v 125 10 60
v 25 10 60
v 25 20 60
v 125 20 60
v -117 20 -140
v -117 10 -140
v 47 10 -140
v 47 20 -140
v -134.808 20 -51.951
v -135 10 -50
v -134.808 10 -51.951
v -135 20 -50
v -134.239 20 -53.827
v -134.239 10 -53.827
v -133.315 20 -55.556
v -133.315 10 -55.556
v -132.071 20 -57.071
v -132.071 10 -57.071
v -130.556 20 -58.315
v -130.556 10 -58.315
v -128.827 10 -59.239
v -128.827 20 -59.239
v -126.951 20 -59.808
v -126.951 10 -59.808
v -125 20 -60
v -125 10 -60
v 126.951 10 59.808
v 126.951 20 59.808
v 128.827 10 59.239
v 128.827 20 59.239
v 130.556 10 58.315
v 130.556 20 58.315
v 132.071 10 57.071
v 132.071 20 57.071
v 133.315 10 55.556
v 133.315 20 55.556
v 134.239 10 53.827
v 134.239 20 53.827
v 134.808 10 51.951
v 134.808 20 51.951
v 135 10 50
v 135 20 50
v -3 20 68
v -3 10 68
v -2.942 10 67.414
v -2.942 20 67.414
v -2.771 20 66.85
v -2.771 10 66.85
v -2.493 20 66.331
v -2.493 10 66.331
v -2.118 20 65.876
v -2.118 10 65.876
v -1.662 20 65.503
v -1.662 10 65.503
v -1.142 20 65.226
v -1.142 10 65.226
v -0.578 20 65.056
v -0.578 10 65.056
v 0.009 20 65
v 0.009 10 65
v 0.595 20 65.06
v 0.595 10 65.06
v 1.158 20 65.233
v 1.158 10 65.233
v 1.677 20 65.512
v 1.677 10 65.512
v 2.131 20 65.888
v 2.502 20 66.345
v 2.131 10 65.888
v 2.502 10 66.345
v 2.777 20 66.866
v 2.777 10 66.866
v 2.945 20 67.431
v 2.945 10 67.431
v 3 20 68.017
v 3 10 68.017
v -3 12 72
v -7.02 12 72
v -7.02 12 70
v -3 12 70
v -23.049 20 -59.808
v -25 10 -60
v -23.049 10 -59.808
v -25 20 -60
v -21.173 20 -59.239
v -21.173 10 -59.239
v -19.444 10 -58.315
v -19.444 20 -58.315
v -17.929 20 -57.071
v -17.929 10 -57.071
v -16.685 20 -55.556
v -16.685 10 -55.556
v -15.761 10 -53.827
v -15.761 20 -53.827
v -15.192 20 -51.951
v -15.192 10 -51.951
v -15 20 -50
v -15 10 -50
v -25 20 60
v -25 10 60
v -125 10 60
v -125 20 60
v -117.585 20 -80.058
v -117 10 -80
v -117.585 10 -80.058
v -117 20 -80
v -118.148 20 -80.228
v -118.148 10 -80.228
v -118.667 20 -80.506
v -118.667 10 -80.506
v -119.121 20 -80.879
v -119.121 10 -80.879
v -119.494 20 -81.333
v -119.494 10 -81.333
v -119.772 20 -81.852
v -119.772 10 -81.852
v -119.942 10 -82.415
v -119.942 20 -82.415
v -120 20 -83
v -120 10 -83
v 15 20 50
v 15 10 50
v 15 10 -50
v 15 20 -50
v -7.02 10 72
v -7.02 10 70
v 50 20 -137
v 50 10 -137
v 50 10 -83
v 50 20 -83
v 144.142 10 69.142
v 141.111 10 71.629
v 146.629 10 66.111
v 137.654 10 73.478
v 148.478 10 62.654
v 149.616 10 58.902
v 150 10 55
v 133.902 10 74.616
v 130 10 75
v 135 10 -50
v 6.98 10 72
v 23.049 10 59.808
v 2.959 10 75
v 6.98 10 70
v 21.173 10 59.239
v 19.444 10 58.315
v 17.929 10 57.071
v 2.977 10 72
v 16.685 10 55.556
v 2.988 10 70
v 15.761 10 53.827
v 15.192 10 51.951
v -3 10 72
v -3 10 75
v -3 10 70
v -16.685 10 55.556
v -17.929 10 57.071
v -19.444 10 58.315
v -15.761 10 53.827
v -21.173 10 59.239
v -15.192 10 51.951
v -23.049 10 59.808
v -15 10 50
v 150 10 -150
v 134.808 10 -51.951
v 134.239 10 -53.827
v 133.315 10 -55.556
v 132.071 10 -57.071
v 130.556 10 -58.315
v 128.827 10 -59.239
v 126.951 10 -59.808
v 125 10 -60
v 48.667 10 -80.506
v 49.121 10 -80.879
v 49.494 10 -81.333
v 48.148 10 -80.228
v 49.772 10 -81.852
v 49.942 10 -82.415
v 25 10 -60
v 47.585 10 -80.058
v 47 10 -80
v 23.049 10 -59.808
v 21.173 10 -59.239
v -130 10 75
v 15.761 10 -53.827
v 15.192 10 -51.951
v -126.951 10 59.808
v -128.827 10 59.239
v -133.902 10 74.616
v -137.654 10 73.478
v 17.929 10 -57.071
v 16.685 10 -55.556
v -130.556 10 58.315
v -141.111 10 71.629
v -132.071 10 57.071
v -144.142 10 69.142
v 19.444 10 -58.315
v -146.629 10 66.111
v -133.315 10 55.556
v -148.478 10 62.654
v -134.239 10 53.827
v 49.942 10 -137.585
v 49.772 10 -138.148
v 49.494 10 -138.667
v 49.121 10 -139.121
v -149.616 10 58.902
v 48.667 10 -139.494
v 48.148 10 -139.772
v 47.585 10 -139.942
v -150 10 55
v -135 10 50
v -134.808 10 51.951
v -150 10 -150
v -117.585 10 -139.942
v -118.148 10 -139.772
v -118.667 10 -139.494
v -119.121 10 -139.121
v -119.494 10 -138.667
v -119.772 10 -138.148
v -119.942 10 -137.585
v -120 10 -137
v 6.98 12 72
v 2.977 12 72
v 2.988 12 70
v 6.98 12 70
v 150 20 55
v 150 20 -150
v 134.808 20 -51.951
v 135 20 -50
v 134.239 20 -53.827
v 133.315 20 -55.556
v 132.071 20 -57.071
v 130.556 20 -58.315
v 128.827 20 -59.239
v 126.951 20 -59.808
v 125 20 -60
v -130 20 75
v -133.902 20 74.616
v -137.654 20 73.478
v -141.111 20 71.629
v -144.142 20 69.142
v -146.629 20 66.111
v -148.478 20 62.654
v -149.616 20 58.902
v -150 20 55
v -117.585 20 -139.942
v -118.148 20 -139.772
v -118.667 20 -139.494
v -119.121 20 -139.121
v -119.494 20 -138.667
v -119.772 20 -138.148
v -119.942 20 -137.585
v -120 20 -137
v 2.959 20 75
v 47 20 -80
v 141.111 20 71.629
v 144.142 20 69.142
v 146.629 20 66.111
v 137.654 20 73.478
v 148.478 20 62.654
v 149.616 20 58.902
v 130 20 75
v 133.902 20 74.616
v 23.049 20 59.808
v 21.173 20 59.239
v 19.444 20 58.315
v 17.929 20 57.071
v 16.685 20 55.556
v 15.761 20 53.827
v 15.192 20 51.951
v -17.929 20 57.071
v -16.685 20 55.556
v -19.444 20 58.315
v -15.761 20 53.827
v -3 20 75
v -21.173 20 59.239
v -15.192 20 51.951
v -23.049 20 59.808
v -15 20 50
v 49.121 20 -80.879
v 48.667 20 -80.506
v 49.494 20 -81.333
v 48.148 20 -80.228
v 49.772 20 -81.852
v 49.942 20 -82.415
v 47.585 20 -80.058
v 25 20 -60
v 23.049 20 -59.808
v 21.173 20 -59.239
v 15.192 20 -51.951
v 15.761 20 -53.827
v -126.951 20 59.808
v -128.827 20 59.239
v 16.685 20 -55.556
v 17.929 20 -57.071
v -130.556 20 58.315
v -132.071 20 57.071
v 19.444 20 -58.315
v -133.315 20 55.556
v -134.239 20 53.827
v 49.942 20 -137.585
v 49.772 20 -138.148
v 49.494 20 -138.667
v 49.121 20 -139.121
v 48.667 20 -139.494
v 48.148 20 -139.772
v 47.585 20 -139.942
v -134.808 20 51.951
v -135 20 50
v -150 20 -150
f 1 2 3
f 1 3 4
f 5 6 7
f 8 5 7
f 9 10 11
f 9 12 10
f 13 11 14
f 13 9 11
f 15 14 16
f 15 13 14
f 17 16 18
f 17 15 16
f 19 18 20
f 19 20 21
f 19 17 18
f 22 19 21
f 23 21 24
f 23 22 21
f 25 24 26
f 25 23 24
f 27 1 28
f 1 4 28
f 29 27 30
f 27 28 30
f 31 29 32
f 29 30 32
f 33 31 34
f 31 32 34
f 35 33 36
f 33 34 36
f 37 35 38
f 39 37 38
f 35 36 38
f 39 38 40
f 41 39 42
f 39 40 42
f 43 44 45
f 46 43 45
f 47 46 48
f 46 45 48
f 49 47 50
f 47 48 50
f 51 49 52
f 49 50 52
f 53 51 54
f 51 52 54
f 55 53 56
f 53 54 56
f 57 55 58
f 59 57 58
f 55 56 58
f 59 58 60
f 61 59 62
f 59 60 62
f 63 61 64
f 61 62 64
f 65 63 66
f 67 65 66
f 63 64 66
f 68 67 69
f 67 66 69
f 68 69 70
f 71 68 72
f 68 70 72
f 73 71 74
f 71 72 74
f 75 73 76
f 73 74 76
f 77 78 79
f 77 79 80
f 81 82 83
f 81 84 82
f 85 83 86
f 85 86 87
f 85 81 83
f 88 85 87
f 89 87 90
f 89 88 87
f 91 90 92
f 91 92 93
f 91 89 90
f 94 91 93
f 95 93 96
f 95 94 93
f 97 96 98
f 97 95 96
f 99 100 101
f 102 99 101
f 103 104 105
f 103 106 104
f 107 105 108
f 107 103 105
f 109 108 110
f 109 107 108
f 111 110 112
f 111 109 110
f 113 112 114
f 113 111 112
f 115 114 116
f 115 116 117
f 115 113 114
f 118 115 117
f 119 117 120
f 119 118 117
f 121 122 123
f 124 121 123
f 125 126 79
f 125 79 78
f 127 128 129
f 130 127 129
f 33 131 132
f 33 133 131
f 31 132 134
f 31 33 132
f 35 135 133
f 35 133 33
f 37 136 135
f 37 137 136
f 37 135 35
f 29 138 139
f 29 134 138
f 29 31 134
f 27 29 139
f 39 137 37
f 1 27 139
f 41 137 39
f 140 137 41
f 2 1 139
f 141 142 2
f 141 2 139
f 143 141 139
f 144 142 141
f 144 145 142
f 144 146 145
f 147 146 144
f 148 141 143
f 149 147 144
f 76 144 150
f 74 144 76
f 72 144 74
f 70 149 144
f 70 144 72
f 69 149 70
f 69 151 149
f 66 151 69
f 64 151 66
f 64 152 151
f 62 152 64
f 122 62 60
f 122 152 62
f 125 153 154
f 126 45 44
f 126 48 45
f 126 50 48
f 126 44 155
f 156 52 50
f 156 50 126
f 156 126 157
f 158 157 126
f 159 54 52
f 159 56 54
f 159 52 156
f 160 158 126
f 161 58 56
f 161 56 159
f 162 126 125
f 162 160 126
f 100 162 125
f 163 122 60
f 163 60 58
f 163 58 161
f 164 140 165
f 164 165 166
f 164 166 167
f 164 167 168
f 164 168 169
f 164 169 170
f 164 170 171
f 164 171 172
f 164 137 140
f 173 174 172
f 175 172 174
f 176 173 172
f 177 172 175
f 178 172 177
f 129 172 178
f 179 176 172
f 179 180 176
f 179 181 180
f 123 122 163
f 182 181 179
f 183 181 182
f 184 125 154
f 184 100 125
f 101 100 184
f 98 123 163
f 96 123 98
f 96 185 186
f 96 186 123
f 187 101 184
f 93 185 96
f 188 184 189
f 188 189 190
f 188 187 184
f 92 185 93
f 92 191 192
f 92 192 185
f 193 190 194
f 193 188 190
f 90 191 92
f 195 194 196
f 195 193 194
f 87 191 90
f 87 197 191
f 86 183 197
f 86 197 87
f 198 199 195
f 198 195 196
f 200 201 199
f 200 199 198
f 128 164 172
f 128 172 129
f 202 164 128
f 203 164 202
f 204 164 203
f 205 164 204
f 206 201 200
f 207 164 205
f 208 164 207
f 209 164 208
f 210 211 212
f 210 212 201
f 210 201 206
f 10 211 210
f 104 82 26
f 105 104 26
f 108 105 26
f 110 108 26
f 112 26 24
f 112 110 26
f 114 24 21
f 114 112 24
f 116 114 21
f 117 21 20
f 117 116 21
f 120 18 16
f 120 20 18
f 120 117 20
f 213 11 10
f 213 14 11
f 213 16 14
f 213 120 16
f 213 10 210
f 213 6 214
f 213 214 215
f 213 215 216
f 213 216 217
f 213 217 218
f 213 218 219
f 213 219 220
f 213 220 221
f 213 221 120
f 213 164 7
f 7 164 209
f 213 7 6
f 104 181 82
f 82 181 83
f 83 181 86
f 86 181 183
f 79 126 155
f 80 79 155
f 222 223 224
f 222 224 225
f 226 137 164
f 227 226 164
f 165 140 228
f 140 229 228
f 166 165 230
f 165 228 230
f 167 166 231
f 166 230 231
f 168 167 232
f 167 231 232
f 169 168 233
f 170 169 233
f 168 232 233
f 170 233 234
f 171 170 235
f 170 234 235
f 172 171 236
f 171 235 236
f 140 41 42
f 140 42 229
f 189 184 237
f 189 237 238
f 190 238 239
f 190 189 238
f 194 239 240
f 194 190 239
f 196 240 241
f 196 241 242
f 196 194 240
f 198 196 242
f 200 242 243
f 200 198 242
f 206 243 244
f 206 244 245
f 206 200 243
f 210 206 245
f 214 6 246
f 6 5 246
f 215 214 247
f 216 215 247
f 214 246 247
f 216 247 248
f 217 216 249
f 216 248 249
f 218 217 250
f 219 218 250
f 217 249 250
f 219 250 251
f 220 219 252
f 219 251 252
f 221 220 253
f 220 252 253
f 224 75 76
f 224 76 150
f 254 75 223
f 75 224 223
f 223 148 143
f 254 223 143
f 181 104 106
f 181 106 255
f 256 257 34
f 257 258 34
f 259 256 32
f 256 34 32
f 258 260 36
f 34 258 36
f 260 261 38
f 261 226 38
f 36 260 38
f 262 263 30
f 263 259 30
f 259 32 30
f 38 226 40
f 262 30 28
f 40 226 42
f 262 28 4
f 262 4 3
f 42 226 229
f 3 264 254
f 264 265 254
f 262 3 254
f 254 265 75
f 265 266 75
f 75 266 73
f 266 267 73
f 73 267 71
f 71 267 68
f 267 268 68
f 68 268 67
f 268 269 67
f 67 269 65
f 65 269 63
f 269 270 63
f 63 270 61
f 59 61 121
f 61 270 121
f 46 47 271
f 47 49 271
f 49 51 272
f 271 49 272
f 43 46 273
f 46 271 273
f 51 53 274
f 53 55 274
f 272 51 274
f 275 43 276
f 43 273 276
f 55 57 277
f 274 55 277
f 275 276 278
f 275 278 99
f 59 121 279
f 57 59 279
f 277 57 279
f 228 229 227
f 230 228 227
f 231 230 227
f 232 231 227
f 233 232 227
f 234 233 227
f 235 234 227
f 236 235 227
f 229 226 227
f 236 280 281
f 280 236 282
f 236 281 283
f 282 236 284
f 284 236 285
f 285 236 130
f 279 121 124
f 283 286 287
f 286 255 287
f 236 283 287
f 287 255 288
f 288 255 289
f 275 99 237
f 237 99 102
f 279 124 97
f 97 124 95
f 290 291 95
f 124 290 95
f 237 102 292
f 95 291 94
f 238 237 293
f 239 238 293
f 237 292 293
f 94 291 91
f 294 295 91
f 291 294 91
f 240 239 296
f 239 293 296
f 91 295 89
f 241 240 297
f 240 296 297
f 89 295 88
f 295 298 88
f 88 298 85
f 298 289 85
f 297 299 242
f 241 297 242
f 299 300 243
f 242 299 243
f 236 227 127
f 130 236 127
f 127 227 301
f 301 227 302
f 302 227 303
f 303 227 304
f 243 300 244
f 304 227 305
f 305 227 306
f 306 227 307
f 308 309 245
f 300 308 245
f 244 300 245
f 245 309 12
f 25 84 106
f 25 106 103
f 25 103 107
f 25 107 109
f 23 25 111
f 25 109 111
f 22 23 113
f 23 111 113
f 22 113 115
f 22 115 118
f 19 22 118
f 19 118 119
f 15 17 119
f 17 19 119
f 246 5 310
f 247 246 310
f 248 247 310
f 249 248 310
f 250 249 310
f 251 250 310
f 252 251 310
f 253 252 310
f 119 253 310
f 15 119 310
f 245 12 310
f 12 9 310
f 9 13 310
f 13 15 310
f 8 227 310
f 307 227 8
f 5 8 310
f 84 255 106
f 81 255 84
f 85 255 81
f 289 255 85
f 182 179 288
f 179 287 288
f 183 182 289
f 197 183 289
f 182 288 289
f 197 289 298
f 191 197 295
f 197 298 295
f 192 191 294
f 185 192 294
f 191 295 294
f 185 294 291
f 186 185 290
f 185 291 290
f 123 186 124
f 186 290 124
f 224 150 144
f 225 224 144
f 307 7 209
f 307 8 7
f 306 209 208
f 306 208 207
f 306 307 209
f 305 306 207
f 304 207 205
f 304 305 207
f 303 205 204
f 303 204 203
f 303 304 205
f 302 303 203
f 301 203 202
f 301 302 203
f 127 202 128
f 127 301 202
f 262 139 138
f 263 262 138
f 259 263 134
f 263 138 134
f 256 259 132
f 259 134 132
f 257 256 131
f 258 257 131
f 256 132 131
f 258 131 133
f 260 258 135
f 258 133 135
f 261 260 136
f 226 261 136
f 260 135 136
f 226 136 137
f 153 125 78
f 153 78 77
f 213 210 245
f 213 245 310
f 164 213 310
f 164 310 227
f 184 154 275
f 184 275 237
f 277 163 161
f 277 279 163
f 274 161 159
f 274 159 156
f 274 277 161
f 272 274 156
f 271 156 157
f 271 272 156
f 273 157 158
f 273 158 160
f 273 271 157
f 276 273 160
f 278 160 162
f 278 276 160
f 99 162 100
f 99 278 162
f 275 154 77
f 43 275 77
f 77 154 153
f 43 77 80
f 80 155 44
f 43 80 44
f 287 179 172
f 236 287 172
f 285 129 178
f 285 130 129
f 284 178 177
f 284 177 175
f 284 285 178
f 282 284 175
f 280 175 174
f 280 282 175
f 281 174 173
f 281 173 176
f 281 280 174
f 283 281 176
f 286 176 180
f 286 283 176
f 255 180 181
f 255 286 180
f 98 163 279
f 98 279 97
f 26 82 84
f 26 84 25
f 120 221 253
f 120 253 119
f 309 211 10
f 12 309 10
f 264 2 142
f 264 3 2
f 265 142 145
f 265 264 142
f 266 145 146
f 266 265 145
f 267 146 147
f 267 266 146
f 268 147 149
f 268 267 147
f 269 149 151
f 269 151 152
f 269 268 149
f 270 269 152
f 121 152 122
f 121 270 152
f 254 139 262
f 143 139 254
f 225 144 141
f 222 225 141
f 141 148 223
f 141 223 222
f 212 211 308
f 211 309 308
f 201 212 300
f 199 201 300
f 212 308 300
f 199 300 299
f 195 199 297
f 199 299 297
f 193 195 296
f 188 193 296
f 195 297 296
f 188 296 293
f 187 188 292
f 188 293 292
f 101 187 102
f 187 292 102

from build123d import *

# Parameters (mm, degrees)
SKIZZE1_W                       = 120
SKIZZE1_H                       = 120
LINEAR_AUSTRAGEN1_DEPTH         = 10
VERRUNDUNG2_R                   = 10
VERRUNDUNG2_OF_SPIEGELN1_R      = 10
SKIZZE3_W                       = 170
SKIZZE3_H                       = 60
SCHNITT_LINEAR_AUSTRAGEN1_DEPTH = 10
VERRUNDUNG3_R                   = 3
SCHNITT_LINEAR_AUSTRAGEN2_DEPTH = 10
SKIZZE5_W                       = 14
SKIZZE5_H                       = 2
SCHNITT_LINEAR_AUSTRAGEN3_DEPTH = 2


with BuildPart() as part:
    # Skizze1 → Linear austragen1 (new body)
    with BuildSketch(Plane(origin=(0, 10, 0), x_dir=(1, 0, 0), z_dir=(0, 1, 0))):
        with BuildLine():
            Line((0, -75), (130, -75))
            ThreePointArc((130, -75), (144.142135624, -69.142135624), (150, -55))
            Line((150, -55), (150, 75))
            Line((150, 75), (150, 150))
            Line((150, 150), (0, 150))
            Line((0, 150), (0, 75))
            Line((0, 75), (0, -75))
        make_face()
        with Locations((75, 0)):
            Rectangle(SKIZZE1_W, SKIZZE1_H, mode=Mode.SUBTRACT)
    linear_austragen1 = extrude(amount=LINEAR_AUSTRAGEN1_DEPTH)

    # Verrundung2
    verrundung2_edges = [part.edges().sort_by_distance(p)[0] for p in [
        (15, 15, -60),
        (15, 15, 60),
        (135, 15, 60),
        (135, 15, -60),
    ]]
    fillet(verrundung2_edges, radius=VERRUNDUNG2_R)

    # Spiegeln1: Linear austragen1 across plane
    add(linear_austragen1.mirror(Plane(origin=(0, 20, -150), x_dir=(0, 0, 1), z_dir=(1, 0, 0))))

    # Verrundung2 of Spiegeln1
    verrundung2_of_spiegeln1_edges = [part.edges().sort_by_distance(p)[0] for p in [
        (-15, 15, -60),
        (-15, 15, 60),
        (-135, 15, 60),
        (-135, 15, -60),
    ]]
    fillet(verrundung2_of_spiegeln1_edges, radius=VERRUNDUNG2_OF_SPIEGELN1_R)

    # Skizze3 → Schnitt-Linear austragen1 (cut)
    with BuildSketch(Plane.XZ.offset(-10)):
        with Locations((-35, -110)):
            Rectangle(SKIZZE3_W, SKIZZE3_H)
    extrude(amount=-SCHNITT_LINEAR_AUSTRAGEN1_DEPTH, mode=Mode.SUBTRACT)

    # Verrundung3
    verrundung3_edges = [part.edges().sort_by_distance(p)[0] for p in [
        (-120, 15, -140),
        (-120, 15, -80),
        (50, 15, -80),
        (50, 15, -140),
    ]]
    fillet(verrundung3_edges, radius=VERRUNDUNG3_R)

    # Skizze4 → Schnitt-Linear austragen2 (cut)
    with BuildSketch(Plane.XZ.offset(-10)):
        with BuildLine():
            Line((-3.000050853, 75), (-3.000050853, 68))
            ThreePointArc((-3.000050853, 68), (0.008683003, 65.000012713), (2.999898294, 68.017467638))
            Line((2.999898294, 68.017467638), (2.959241489, 75))
            Line((2.959241489, 75), (-3.000050853, 75))
        make_face()
    extrude(amount=-SCHNITT_LINEAR_AUSTRAGEN2_DEPTH, mode=Mode.SUBTRACT)

    # Skizze5 → Schnitt-Linear austragen3 (cut)
    with BuildSketch(Plane.XZ.offset(-10)):
        with Locations((-0.020404682, 71)):
            Rectangle(SKIZZE5_W, SKIZZE5_H)
    extrude(amount=-SCHNITT_LINEAR_AUSTRAGEN3_DEPTH, mode=Mode.SUBTRACT)


solid = part.part
